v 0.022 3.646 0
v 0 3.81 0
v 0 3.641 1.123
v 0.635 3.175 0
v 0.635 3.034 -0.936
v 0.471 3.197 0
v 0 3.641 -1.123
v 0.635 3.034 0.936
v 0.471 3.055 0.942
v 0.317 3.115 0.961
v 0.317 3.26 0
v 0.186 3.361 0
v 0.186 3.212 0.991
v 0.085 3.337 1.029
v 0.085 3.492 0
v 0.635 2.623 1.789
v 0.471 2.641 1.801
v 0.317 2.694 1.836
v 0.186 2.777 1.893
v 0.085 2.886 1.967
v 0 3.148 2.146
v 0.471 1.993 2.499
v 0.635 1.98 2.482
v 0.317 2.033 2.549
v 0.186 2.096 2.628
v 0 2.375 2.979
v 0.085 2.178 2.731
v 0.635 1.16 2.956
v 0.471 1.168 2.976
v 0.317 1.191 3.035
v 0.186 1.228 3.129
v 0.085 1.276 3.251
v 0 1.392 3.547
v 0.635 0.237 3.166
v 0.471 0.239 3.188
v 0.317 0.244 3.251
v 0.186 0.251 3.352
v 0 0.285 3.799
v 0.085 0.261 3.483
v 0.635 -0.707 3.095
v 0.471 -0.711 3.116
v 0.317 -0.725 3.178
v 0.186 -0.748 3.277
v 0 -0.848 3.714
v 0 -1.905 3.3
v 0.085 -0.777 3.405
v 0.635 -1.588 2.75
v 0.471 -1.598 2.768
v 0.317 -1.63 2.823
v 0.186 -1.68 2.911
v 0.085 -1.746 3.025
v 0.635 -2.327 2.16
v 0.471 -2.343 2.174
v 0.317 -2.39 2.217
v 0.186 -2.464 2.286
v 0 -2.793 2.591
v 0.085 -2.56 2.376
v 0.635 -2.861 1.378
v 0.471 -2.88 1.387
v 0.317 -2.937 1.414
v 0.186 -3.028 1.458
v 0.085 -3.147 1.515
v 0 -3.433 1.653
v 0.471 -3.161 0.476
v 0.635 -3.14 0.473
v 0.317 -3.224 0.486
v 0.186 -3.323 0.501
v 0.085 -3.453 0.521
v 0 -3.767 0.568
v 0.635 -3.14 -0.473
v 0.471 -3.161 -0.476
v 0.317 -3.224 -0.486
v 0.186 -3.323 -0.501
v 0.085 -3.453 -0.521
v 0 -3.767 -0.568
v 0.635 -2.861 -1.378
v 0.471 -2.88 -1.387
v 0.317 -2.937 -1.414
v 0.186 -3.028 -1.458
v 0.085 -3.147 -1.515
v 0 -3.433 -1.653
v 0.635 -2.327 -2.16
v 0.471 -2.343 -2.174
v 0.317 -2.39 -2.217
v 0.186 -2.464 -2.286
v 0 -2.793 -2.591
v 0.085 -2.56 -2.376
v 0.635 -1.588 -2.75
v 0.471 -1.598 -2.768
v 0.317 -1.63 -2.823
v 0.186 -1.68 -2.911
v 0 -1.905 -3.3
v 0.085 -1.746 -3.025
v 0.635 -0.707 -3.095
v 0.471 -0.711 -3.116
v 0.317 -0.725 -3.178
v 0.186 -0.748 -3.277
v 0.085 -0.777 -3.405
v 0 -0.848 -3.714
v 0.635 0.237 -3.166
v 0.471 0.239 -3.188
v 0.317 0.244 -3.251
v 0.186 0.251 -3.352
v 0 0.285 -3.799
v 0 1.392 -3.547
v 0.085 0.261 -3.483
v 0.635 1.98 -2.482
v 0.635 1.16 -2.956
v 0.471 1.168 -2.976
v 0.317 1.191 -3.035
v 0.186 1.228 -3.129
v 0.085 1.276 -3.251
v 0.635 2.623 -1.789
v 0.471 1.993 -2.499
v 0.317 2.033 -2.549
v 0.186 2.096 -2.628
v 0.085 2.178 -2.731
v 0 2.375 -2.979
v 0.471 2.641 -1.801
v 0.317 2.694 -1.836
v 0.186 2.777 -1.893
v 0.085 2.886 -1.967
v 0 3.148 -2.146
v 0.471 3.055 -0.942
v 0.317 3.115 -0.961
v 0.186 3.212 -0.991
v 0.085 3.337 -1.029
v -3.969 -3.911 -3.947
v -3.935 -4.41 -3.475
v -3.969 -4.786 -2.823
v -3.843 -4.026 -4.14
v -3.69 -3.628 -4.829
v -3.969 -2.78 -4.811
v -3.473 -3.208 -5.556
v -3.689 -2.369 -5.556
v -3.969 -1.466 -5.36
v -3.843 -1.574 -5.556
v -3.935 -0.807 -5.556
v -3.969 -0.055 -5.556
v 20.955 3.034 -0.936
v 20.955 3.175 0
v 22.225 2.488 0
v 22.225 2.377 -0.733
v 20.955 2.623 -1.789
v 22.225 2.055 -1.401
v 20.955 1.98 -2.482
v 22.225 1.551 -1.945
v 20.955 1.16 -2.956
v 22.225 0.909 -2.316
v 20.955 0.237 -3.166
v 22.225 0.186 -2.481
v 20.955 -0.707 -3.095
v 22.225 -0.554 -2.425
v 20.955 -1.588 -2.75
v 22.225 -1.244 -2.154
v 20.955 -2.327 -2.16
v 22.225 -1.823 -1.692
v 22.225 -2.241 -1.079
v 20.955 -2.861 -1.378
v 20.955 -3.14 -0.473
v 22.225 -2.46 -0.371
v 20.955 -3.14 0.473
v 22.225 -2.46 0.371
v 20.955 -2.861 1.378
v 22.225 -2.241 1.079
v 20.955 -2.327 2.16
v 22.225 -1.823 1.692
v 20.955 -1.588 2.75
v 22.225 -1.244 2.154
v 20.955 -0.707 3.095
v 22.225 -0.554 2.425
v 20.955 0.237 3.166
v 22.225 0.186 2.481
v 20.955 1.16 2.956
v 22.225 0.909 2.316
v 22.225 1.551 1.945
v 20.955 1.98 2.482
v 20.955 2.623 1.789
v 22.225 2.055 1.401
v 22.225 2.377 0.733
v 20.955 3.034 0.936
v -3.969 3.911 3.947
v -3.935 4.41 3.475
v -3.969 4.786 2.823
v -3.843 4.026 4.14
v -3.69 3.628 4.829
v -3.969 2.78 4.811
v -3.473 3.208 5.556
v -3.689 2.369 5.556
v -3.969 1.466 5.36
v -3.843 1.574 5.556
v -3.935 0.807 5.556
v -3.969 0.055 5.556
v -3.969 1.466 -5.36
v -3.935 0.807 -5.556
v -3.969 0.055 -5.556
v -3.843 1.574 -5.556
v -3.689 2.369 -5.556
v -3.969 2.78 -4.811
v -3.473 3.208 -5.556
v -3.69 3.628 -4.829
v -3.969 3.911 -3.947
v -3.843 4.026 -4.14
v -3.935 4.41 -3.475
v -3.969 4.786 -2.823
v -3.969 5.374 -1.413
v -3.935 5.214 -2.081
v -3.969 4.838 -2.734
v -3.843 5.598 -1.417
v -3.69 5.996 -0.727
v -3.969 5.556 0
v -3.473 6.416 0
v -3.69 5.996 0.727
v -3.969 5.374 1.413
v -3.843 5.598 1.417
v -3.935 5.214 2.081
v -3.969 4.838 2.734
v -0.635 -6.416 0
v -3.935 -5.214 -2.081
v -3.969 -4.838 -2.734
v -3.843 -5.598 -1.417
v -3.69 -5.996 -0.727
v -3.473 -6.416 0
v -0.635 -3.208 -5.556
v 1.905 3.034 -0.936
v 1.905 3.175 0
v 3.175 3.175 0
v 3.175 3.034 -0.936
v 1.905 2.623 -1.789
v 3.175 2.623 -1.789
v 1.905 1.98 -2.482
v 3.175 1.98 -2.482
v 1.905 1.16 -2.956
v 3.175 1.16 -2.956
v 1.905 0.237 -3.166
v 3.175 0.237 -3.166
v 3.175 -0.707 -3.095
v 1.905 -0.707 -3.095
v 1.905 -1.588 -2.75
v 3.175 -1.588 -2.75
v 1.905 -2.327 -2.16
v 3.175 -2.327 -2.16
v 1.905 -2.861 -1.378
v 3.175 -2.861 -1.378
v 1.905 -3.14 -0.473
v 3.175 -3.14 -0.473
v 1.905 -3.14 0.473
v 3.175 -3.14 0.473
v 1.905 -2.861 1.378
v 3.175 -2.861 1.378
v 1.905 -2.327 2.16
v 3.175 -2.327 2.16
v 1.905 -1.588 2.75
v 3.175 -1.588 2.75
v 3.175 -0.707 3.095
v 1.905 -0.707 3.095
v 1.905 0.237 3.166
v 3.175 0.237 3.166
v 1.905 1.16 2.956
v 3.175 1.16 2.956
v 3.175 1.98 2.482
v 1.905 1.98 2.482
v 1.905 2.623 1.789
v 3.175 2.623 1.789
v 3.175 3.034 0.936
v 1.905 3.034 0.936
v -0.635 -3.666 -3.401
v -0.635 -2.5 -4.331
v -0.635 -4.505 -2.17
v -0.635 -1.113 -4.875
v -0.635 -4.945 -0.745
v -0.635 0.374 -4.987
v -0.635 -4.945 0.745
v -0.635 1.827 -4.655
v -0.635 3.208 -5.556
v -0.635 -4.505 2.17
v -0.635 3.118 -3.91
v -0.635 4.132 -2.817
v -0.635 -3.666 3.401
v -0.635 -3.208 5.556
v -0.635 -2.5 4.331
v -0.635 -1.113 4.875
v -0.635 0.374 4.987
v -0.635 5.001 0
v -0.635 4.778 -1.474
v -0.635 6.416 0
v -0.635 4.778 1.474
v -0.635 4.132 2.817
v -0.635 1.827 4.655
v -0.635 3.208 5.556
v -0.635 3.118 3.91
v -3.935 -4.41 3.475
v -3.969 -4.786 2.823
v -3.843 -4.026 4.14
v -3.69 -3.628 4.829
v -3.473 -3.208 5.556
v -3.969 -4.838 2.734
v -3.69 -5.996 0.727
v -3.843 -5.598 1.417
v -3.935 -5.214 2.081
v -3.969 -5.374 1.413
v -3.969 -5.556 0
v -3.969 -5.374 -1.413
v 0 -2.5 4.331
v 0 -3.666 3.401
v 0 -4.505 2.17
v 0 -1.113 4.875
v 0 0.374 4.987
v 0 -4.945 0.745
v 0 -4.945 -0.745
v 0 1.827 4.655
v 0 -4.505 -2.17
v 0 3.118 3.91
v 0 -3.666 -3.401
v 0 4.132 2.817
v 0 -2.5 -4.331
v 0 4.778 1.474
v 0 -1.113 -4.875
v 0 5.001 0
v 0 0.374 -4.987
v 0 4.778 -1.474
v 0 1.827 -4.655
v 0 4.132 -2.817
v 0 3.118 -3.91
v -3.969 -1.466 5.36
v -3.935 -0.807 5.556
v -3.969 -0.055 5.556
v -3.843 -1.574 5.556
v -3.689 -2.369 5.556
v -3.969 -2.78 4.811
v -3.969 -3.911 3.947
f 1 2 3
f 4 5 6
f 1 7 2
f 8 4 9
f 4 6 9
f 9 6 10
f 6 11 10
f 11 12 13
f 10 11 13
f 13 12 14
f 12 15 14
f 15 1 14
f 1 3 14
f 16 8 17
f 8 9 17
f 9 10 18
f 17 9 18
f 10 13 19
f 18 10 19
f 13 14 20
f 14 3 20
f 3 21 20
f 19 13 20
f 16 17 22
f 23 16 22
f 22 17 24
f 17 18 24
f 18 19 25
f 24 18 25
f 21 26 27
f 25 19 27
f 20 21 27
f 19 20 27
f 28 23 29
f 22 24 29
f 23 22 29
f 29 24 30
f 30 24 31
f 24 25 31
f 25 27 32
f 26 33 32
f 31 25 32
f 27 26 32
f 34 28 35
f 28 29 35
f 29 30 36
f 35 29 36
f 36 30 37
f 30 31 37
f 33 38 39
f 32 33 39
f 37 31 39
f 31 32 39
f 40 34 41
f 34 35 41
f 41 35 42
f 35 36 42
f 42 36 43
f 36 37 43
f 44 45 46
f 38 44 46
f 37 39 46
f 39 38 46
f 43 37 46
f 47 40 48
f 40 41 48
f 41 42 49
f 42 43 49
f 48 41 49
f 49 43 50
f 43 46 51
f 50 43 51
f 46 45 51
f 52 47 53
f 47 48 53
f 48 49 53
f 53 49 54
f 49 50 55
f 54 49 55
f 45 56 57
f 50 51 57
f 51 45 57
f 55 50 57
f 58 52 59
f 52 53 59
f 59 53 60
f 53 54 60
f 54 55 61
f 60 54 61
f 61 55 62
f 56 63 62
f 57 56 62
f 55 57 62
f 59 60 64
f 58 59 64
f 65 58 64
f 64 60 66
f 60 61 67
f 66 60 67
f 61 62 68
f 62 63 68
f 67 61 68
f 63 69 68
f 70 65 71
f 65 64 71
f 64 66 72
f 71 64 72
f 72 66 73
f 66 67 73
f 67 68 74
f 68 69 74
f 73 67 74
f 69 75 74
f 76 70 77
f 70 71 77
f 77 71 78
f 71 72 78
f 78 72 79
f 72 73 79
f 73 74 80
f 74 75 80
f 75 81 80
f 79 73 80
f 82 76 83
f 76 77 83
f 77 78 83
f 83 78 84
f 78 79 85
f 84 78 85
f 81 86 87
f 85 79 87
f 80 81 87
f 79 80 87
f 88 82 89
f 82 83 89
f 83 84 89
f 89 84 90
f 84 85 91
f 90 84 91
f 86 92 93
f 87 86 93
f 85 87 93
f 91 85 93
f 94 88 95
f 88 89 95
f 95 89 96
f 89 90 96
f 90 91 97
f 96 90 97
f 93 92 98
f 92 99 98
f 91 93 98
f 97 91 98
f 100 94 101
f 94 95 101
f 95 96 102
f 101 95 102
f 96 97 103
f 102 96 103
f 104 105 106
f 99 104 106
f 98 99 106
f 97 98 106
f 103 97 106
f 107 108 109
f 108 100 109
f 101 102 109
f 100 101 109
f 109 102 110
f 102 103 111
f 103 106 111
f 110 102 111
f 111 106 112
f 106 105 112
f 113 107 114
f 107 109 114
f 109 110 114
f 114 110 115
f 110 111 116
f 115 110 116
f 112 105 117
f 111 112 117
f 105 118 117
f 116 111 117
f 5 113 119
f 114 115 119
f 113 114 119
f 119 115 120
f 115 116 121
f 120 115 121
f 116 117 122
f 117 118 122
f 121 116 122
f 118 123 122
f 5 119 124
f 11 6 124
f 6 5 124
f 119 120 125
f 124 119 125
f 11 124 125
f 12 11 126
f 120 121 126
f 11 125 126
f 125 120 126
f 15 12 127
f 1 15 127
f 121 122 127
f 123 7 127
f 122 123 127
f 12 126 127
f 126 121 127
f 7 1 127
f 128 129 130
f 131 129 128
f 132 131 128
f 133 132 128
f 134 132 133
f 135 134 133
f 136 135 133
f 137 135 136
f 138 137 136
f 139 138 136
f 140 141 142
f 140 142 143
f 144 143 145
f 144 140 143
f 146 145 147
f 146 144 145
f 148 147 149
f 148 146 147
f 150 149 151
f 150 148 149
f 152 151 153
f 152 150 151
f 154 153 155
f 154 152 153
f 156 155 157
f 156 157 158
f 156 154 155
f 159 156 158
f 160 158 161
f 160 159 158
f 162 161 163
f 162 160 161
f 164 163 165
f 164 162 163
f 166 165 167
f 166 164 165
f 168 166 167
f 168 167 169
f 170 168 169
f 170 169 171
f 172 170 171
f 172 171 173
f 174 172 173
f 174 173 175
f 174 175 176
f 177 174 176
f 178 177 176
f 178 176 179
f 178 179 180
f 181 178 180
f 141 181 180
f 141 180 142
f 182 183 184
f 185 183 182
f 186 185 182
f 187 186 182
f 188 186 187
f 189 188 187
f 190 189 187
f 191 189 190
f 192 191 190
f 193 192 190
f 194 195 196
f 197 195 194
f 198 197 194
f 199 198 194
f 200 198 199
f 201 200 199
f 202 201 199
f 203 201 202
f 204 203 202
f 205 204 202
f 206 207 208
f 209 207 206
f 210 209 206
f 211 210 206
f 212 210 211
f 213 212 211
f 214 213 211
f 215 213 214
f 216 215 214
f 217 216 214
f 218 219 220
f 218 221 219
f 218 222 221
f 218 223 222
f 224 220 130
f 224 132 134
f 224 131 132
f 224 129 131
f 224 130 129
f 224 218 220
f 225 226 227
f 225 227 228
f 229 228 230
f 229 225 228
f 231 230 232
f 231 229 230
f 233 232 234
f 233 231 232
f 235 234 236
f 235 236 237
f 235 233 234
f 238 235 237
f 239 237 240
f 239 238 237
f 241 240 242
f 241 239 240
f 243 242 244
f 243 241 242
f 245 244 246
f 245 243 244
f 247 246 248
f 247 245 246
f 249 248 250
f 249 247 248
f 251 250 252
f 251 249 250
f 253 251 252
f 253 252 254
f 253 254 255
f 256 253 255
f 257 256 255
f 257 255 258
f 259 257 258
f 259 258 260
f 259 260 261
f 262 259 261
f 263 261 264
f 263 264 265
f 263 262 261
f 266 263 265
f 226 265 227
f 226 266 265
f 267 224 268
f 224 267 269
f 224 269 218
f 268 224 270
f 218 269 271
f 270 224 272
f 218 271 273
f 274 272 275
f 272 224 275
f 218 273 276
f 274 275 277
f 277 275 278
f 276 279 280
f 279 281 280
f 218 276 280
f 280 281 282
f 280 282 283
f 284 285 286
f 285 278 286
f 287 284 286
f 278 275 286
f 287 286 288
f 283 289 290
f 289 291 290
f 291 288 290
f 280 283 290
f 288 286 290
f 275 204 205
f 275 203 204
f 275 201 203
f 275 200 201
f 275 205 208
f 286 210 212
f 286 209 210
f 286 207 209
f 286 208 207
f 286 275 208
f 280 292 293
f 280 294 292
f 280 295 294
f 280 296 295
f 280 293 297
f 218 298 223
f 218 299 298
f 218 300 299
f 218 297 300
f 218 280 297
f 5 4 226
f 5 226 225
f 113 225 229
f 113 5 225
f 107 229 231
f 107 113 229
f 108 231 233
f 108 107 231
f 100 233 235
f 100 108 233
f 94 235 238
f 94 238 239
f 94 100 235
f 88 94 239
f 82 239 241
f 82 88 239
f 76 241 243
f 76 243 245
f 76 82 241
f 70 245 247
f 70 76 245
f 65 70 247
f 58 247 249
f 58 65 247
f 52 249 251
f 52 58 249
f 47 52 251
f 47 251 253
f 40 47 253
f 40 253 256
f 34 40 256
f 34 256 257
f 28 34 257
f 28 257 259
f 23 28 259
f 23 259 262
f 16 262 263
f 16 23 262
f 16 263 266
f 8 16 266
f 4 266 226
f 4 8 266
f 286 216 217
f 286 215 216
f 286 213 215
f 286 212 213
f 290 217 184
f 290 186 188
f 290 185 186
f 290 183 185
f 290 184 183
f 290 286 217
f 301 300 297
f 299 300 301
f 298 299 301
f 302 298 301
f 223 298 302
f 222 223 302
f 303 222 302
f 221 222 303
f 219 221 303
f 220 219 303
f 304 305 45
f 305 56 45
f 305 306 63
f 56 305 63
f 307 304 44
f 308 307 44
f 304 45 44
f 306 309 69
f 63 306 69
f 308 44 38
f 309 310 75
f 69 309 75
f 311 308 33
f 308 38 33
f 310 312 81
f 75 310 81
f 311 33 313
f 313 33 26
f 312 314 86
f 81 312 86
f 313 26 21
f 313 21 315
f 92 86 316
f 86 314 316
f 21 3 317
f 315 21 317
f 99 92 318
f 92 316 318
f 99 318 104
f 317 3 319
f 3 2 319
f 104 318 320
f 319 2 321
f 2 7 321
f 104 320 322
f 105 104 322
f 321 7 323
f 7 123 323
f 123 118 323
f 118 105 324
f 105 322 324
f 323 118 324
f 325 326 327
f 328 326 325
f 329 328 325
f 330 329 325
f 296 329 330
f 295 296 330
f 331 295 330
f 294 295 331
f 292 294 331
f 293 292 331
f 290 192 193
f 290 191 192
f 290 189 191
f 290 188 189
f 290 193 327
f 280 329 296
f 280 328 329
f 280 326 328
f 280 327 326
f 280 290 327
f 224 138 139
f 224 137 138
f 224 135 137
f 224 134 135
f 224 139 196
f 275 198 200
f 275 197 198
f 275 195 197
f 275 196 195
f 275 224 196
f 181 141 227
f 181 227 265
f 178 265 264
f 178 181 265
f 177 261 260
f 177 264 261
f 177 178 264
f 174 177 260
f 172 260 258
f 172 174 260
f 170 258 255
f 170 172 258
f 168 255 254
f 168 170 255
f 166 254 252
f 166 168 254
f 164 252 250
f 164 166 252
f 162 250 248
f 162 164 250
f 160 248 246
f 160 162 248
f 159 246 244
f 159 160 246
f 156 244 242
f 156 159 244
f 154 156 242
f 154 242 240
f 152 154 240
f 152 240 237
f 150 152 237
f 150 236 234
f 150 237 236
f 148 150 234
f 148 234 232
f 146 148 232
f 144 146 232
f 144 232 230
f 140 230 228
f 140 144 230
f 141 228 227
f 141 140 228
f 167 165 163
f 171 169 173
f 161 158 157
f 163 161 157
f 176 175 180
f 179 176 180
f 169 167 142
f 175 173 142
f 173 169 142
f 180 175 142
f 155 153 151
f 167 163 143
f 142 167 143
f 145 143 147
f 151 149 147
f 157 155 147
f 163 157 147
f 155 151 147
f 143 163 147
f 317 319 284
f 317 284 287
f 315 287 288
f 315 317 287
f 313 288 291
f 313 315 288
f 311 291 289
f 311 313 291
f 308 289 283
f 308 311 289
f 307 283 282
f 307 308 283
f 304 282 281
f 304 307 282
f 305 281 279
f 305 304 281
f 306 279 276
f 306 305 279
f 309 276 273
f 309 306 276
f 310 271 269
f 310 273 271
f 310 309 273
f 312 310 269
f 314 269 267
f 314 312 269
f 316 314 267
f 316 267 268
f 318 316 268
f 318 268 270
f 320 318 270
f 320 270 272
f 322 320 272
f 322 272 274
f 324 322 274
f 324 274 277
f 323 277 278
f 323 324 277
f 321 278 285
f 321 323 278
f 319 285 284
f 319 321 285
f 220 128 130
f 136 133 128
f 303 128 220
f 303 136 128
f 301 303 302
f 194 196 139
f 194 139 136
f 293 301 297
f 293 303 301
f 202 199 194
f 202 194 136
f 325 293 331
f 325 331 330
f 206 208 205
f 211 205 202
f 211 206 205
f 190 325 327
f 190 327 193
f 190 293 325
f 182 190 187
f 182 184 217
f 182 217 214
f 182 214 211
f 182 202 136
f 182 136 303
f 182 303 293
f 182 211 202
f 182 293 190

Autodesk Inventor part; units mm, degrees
ref_plane "YZ Plane" through (0, 0, 0) normal (1, 0, 0) x (0, 1, 0)
ref_plane "XZ Plane" through (0, 0, 0) normal (0, 1, 0) x (-1, 0, 0)
sketch "Sketch1" plane through (0, 0, 0) normal (0, 0, 1) x (1, 0, 0)
  line L0 (0, 5.0006) -> (0, 3.175)
  line L1 (3.175, 3.175) -> (22.225, 3.175)
  line L2 (22.225, 3.175) -> (22.225, 0)
  line L3 (22.225, 0) -> (-0.6351, 0)
  line L4 (-5.2071, 0) -> (26.797, 0) projected
  line L5 (-0.6351, 0) -> (-0.6351, 5.0006)
  line L6 (-0.6351, 5.0006) -> (0, 5.0006)
  line L7 (3.175, 3.175) -> (1.9049, 3.175)
  line L8 (1.9049, 3.175) -> (0, 3.175)
  line L9 (0, -1.0001) -> (0, 6.0007) projected
  dimension "d0" = 22.225
  dimension "d1" = 19.05
  dimension "d2" = 6.35
  dimension "d9" = 0.6351
  dimension "d10" = 10.0013
  dimension "d13" = 1.2701
  dimension "d14" = 6.35
revolve "Body" add sketch "Sketch1" angle 360 about axis through (22.225, 0, 0) along (-1, 0, 0)
sketch "Sketch2" plane through (-0.6351, 0, 0) normal (-1, 0, 0) x (0, 0, 1)
  line L0 (0, 6.4158) -> (5.5562, 3.2079)
  line L1 (5.5562, 3.2079) -> (5.5562, -3.2079)
  line L2 (5.5562, -3.2079) -> (0, -6.4158)
  line L3 (0, -6.4158) -> (-5.5562, -3.2079)
  line L4 (-5.5562, -3.2079) -> (-5.5562, 3.2079)
  line L5 (-5.5562, 3.2079) -> (0, 6.4158)
  point P0 (0, 0)
  point P1 (0, 0)
  dimension "d11" = 11.1125
extrude "Head" add sketch "Sketch2" along normal blind 3.3337
sketch "Sketch4" plane through (0, 0, 0) normal (0, 0, 1) x (1, 0, 0)
  line L0 (-3.9689, 5.5563) -> (-3.9689, 6.4158)
  line L1 (-3.9689, 6.4158) -> (-3.4726, 6.4158)
  line L2 (-3.4726, 6.4158) -> (-3.9689, 5.5563)
  line L3 (-4.6356, 0) -> (0.0317, 0) projected
  line L4 (-0.6351, 6.4158) -> (-3.9688, 6.4158) projected
  line L5 (-3.9688, 3.2079) -> (-3.9688, 6.4158) projected
  dimension "d5" = 30
  dimension "d19" = 11.1125
revolve "Chamfer1" cut sketch "Sketch4" angle 360 about axis through (-10, 0, 0) along (1, 0, 0)
thread "Thread" size "1/4-20 UNC" class "2A" standard "ANSI Unified Screw Threads" length 19.05
chamfer "Chamfer2" distance 0.6875 distance2 1.2701 1 edges at (22.225, -3.175, 0) measured on face at (22.225, -0.1276, -1.0506)
ref_plane "Work Plane1" through (1.525, 0, 0) normal (0, 0, 1) x (1, 0, 0)
fillet "Fillet2" radius 0.635 1 edges at (0, -3.175, 0)
equation "\"d0\" = NLG"
equation "\"d1\" = GEL"
equation "\"d2\" = GD"
equation "\"d10\" = SD2"
equation "\"d14\" = BDM"
equation "\"d11\" = SW"
equation "\"d3\" = KOH - SD"
equation "\"d5\" = ANG1"
equation "\"d19\" = SW0"
equation "\"d63\" = R"
equation "\"d15\" = GEL"
equation "\"d6\" = -0.5 * SPD + 0.5 * GD"
equation "\"NLG\" = 22.225"
equation "\"GD\" = NND"
equation "\"BDM\" = 6.35"
equation "\"KOH\" = 3.96875"
equation "\"GEL\" = 19.05"
equation "\"SW\" = 11.1125"
equation "\"SW0\" = SW"
equation "\"SPD\" = 4.9751"
equation "\"SD2\" = 10.00125"
equation "\"SD\" = 0.635"
equation "\"ANG1\" = 30deg"
equation "\"GAL\" = 1.27"
equation "\"GUL\" = 1.27"
equation "\"R\" = 0.635"
equation "\"d62\" = -NLG - SD + GUL"
equation "\"THREADDIA\" = 6.35"
equation "\"TOA\" = 30deg"
equation "\"RR\" = 0.254"
equation "\"NND\" = 6.35"
equation "\"E0\" = 1.155 * SW"
equation "\"SLG\" = 0"
equation "\"GD1\" = 4.9751"
properties part number "ANSI B18.2.1 - 1/4-20 UNC - 0.875" material "Steel, Mild"
